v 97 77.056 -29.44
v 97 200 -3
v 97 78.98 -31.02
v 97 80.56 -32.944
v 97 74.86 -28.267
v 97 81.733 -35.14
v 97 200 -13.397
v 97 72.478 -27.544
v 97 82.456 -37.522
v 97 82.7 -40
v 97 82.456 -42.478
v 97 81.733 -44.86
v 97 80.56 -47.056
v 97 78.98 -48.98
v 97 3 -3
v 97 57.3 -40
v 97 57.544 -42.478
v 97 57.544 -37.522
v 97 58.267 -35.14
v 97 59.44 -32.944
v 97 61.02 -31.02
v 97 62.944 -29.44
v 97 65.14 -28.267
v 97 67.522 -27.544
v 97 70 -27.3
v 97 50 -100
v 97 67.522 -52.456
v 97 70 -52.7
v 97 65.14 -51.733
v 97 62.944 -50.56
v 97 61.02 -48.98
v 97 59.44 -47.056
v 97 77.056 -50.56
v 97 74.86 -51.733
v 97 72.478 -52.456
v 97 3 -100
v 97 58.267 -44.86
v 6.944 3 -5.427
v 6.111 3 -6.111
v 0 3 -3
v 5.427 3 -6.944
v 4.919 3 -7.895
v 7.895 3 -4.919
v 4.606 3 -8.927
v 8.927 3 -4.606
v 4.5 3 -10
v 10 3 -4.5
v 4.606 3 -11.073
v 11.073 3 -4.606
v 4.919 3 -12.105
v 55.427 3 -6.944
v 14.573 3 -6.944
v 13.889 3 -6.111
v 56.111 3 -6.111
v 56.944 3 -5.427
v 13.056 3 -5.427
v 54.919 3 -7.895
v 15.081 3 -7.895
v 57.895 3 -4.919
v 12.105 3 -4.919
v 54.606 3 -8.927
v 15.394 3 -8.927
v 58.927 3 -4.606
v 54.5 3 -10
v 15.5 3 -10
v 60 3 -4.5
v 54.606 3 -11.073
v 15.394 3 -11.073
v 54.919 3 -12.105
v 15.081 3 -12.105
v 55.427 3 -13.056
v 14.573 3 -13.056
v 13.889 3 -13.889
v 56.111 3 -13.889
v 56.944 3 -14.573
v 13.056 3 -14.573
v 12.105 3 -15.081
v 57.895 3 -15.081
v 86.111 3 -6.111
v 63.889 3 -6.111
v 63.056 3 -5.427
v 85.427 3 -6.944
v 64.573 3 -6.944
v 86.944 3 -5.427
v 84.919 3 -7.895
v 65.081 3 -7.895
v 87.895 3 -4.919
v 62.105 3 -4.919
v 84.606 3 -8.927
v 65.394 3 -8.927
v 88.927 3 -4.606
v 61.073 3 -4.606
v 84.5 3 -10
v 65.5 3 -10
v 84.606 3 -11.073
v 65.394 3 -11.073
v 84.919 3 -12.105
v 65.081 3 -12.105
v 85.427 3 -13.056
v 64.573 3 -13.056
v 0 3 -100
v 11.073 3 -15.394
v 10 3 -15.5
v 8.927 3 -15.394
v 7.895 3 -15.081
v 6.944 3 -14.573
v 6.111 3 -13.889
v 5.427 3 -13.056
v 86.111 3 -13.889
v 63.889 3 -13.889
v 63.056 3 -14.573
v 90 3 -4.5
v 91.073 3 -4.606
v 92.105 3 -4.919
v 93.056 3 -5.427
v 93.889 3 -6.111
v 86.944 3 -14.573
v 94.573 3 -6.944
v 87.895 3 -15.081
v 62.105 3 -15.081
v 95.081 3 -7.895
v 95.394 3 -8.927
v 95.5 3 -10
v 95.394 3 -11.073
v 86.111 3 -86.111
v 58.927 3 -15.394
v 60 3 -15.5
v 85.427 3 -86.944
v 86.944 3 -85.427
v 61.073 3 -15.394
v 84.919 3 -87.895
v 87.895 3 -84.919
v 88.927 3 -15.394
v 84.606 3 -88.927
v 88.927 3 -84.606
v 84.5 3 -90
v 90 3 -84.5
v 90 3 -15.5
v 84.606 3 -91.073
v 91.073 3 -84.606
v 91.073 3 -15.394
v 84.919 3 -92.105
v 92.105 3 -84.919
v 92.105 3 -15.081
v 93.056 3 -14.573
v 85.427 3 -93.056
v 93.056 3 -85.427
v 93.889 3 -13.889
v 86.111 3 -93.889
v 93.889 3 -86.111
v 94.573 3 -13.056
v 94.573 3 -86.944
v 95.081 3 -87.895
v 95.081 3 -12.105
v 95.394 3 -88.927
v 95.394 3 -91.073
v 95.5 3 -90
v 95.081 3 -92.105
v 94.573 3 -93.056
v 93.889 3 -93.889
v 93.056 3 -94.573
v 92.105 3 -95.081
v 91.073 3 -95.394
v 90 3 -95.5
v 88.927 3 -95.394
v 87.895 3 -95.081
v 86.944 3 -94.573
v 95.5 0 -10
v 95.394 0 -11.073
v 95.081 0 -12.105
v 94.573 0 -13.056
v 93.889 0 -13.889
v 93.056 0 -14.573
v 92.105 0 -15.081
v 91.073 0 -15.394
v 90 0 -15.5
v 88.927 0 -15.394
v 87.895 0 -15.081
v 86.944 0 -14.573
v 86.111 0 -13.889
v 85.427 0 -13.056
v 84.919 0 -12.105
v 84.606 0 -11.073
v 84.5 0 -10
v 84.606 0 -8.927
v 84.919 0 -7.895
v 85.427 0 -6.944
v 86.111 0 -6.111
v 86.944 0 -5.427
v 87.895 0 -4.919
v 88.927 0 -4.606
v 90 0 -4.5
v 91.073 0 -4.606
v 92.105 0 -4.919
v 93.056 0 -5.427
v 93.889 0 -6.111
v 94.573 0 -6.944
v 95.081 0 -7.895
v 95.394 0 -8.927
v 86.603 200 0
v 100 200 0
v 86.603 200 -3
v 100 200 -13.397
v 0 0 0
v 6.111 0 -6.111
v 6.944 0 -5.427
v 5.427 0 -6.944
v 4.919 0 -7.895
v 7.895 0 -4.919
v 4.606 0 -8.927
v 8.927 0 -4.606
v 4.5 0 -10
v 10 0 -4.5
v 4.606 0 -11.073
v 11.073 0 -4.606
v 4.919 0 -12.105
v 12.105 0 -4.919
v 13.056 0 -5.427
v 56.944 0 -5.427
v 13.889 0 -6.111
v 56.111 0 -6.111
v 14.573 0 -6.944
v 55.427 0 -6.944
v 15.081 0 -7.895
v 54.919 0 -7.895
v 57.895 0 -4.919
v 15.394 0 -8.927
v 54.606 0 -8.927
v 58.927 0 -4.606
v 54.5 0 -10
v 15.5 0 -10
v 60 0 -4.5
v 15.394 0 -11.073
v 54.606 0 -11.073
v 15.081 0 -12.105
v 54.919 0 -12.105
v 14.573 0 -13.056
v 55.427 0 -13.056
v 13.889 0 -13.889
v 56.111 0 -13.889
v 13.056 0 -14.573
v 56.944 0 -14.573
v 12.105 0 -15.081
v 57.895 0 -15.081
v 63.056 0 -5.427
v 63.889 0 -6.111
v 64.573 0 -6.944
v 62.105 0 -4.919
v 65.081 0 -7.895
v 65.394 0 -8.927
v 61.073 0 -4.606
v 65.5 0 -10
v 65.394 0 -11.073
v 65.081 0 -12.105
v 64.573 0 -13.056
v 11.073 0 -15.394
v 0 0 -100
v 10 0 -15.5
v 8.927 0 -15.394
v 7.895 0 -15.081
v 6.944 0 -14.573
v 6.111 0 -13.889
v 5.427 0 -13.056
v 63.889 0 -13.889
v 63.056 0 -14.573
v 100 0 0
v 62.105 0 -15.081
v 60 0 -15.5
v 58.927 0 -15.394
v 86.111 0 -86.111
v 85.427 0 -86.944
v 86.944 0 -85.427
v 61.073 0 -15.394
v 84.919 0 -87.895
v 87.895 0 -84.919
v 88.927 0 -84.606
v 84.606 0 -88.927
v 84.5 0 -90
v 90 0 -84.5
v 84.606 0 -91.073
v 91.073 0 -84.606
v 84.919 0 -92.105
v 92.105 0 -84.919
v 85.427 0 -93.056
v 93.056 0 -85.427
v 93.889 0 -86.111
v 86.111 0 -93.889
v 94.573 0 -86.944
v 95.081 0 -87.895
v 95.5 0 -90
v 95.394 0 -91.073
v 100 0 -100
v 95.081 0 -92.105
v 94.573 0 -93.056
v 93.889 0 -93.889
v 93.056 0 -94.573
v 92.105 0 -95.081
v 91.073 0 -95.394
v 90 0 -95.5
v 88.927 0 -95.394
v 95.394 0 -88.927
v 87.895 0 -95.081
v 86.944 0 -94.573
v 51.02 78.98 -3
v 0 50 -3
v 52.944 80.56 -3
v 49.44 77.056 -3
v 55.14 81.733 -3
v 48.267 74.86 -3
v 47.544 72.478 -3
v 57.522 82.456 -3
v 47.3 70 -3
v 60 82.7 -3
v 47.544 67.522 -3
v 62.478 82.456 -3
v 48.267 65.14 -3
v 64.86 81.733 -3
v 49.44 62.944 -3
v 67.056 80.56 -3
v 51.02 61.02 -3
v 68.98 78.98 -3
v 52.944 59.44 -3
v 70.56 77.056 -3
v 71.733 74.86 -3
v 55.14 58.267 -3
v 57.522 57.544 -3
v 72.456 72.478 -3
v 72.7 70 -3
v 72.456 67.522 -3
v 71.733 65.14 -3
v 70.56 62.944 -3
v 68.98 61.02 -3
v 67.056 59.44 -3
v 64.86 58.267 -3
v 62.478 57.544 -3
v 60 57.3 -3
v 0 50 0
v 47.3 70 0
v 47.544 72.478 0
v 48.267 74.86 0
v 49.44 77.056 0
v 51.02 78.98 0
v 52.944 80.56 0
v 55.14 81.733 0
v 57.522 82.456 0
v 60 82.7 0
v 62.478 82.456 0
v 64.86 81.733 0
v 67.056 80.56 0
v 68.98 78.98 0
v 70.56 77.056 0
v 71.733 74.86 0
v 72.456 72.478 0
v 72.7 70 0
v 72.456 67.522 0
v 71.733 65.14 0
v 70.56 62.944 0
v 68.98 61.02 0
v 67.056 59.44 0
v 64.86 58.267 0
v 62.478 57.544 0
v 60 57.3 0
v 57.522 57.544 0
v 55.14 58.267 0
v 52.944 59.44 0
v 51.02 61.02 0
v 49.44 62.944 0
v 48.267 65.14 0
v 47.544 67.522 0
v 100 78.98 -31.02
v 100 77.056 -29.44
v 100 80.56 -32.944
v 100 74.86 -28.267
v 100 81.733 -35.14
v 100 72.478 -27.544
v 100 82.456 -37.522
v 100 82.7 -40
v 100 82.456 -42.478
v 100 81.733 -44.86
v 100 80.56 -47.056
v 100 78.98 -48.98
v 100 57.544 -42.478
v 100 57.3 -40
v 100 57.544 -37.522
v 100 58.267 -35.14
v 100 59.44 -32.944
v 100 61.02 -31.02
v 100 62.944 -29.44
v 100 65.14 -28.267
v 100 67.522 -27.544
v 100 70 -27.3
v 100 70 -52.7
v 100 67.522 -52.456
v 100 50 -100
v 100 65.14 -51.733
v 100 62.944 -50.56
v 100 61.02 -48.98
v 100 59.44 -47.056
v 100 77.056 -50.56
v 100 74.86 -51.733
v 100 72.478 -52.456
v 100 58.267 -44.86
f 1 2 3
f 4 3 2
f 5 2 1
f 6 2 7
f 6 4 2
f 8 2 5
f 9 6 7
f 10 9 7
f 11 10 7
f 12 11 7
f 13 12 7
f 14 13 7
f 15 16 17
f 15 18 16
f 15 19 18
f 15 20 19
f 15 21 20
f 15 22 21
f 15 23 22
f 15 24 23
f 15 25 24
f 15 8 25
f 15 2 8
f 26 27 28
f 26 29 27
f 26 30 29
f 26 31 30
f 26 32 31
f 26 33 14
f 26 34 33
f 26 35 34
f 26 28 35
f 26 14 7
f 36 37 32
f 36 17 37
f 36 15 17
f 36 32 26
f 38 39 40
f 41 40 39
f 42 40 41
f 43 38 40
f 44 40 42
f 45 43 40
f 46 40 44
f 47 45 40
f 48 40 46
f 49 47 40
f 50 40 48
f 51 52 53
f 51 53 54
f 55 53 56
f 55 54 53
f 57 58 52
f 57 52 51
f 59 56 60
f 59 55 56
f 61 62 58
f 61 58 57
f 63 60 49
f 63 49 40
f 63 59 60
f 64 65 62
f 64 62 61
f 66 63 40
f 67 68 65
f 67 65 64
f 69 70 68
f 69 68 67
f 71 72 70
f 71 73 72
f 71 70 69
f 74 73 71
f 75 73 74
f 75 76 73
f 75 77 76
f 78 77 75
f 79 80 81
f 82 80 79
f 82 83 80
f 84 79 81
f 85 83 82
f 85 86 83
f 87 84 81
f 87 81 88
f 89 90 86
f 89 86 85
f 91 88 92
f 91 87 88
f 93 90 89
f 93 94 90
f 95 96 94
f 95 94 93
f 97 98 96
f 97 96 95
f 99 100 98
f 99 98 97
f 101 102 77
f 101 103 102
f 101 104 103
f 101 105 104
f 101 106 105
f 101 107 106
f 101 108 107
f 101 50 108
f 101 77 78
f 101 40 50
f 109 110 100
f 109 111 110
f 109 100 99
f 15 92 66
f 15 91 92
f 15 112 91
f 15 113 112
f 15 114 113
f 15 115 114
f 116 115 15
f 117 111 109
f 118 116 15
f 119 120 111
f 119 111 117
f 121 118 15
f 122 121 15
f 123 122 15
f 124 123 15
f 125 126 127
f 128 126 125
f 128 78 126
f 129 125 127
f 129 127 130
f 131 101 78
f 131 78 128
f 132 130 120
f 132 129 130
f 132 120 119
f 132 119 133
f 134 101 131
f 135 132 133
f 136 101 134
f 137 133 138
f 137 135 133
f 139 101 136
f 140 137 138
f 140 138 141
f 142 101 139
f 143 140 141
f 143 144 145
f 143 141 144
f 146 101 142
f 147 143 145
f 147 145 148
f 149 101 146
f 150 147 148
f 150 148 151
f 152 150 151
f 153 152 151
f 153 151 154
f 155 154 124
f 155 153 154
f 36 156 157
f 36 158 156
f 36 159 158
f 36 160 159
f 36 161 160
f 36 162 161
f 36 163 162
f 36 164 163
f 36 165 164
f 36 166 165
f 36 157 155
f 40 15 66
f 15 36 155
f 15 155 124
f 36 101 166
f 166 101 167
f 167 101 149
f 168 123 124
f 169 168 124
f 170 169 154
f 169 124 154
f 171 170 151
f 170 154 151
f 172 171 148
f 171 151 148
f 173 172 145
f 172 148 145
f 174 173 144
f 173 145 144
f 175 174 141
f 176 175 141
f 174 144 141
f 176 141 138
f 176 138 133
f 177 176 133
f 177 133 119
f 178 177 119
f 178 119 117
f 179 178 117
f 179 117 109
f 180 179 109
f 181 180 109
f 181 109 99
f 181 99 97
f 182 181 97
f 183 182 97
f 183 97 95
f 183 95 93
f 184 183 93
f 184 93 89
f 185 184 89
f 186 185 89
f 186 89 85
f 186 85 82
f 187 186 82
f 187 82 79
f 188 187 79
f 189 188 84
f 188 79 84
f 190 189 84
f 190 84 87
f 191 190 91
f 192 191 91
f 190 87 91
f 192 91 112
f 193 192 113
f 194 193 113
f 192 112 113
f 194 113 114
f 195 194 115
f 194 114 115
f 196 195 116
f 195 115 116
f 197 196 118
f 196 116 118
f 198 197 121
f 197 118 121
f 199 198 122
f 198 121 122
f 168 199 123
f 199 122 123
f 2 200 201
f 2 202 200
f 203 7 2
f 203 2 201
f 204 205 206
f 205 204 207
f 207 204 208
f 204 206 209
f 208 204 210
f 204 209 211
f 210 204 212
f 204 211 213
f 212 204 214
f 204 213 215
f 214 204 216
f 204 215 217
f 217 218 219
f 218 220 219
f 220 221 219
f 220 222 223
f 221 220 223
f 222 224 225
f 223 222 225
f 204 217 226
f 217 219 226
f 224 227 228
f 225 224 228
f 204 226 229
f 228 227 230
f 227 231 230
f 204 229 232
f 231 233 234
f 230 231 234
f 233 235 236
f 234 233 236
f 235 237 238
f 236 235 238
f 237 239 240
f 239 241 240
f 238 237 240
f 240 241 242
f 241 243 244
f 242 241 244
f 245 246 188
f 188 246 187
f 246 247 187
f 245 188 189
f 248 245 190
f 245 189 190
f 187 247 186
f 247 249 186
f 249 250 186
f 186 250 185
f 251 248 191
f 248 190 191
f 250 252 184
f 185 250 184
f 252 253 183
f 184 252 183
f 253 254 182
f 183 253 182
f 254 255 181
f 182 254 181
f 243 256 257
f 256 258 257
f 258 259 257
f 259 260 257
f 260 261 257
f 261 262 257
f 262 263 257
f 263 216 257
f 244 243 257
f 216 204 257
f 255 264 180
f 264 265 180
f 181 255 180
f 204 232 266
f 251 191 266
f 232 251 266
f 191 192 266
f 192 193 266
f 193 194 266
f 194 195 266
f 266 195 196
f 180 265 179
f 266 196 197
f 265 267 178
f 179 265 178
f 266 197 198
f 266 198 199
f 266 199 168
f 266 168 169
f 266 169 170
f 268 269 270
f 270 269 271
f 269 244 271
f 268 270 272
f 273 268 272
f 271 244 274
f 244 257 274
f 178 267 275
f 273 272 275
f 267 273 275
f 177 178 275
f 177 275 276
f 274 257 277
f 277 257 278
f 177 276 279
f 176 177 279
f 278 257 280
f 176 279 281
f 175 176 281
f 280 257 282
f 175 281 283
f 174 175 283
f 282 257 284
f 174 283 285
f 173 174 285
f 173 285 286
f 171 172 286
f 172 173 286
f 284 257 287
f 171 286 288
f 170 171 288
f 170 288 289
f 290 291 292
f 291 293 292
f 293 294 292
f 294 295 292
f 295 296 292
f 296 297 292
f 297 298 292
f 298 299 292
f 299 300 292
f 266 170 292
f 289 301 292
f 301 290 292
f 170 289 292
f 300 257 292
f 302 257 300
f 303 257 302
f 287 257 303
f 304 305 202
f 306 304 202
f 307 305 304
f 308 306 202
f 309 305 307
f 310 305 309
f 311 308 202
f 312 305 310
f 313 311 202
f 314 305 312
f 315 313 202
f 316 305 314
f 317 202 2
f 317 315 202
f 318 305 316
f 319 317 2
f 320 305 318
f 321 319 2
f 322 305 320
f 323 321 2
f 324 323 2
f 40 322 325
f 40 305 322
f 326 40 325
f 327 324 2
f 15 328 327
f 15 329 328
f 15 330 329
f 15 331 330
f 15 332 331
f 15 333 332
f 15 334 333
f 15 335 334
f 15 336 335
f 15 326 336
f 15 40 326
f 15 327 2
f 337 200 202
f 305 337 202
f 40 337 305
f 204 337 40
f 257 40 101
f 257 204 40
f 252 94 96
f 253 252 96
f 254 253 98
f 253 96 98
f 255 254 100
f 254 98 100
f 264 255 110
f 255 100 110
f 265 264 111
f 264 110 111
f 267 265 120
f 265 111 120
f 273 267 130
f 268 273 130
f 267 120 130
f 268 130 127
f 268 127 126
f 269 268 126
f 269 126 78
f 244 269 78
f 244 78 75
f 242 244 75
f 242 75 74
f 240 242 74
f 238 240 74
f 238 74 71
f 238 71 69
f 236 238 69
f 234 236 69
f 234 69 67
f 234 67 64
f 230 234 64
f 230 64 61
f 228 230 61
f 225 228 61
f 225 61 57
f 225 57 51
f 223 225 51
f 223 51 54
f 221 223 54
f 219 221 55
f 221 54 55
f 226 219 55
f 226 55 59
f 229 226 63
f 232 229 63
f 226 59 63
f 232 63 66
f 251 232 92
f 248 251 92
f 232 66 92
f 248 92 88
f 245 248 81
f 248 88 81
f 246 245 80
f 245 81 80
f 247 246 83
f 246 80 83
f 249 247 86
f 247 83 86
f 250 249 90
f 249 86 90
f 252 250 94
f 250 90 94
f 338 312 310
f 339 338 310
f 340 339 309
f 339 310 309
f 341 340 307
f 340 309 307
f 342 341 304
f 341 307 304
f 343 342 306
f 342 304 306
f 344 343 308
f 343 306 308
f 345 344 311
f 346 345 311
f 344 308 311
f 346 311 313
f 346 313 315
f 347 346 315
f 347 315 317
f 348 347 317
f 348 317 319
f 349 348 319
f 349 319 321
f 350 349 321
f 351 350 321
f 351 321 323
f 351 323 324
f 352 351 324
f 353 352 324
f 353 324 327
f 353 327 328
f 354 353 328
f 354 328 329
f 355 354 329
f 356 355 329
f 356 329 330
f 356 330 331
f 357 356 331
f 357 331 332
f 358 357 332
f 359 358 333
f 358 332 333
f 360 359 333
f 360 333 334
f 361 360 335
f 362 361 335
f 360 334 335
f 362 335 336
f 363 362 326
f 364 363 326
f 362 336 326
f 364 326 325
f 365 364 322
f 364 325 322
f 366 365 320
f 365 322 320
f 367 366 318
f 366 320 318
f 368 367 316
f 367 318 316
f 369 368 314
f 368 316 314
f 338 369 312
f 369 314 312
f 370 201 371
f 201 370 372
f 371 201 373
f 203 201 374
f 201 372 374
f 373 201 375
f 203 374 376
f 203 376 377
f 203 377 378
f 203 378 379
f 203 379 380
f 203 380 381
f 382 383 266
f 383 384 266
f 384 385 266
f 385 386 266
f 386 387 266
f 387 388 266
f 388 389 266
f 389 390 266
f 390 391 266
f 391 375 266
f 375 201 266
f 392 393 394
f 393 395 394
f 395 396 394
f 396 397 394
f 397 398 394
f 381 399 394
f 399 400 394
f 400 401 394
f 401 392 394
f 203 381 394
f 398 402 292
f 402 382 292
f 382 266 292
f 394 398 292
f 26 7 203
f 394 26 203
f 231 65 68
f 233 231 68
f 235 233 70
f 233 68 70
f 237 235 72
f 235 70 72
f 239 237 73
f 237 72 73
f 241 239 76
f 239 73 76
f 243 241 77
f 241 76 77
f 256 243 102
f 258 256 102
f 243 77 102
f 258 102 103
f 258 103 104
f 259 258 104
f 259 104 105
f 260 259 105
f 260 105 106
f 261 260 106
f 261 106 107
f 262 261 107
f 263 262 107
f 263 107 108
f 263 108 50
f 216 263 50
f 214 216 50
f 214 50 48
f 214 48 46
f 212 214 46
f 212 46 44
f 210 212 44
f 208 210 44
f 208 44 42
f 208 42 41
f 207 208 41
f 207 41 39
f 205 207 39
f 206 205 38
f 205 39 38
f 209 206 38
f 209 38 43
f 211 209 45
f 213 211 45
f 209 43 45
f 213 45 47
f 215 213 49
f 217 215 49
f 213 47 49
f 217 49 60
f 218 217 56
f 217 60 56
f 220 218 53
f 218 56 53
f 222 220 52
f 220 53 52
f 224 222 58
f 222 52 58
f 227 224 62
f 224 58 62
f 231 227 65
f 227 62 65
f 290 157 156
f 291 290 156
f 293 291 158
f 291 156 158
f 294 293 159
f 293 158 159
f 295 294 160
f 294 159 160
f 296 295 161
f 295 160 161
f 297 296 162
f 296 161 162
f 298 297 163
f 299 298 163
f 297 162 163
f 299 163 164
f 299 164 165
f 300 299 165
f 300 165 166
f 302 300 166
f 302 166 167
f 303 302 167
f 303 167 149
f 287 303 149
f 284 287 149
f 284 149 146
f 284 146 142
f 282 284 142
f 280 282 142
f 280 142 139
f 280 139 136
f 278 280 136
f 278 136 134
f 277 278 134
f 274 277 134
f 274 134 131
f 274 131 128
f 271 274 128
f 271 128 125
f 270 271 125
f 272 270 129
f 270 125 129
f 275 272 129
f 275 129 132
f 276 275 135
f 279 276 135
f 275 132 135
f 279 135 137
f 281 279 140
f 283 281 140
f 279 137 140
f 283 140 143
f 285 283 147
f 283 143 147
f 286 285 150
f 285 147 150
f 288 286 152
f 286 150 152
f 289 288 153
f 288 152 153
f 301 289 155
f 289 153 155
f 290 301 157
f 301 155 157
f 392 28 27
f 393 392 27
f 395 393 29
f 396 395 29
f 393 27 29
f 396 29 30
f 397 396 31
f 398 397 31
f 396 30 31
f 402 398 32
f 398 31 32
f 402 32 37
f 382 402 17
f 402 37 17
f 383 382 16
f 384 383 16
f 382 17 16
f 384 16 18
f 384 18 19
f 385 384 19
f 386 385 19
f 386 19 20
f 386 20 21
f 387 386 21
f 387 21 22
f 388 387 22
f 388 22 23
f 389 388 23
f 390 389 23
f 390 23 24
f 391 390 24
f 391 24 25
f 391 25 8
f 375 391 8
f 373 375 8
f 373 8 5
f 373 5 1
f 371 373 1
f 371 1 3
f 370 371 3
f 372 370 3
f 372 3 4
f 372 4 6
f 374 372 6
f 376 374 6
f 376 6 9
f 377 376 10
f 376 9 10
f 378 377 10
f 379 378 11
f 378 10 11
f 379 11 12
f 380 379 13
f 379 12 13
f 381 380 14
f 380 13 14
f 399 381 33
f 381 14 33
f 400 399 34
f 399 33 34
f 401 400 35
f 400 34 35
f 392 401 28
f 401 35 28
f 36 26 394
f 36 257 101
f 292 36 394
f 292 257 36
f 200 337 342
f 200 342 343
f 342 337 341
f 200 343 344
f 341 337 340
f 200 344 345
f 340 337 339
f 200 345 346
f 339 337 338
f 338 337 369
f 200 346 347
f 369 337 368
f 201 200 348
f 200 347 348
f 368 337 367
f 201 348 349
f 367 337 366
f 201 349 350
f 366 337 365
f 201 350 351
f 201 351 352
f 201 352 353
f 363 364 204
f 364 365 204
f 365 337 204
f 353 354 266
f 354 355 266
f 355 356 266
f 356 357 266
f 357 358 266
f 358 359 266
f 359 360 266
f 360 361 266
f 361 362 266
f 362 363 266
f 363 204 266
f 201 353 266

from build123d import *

# Parameters (mm, degrees)
SKIZZE1_W                       = 100
SKIZZE1_H                       = 100
AUFSATZ_LINEAR_AUSTRAGEN1_DEPTH = 200
WANDUNG1_T                      = -3
FASE1_SIZE                      = 150
FASE1_SIZE2                     = 86.602540378
FASE1_PART_2_SIZE               = 150
FASE1_PART_2_SIZE2              = 86.602540378
BOHRUNG1_D                      = 25.4
BOHRUNG1_DEPTH                  = 3
BOHRUNG1_ON_FACE_2_D            = 25.4
BOHRUNG1_ON_FACE_2_DEPTH        = 3
DURCHGANGSLOCH_F_R_M101_D       = 11
DURCHGANGSLOCH_F_R_M101_DEPTH   = 3


with BuildPart() as part:
    # Skizze1 → Aufsatz-Linear austragen1 (new body)
    with BuildSketch(Plane(origin=(0, 0, 0), x_dir=(1, 0, 0), z_dir=(0, 1, 0))):
        with Locations((50, 50)):
            Rectangle(SKIZZE1_W, SKIZZE1_H)
    extrude(amount=AUFSATZ_LINEAR_AUSTRAGEN1_DEPTH)

    # Wandung1
    wandung1_openings = [part.faces().sort_by_distance(p)[0] for p in [
        (50, 200, -50),
        (50, 100, -100),
        (0, 100, -50),
    ]]
    offset(amount=WANDUNG1_T, openings=wandung1_openings, kind=Kind.INTERSECTION)

    # Fase1
    fase1_edges = [part.edges().sort_by_distance(p)[0] for p in [
        (98.5, 200, -100),
    ]]
    fase1_side = [part.faces().sort_by_distance(p)[0] for p in [
        (98.5, 197.763932023, -100),
    ]]
    chamfer(fase1_edges, length=FASE1_SIZE, length2=FASE1_SIZE2, reference=fase1_side[0])

    # Fase1 part 2
    fase1_part_2_edges = [part.edges().sort_by_distance(p)[0] for p in [
        (0, 200, -1.5),
    ]]
    fase1_part_2_side = [part.faces().sort_by_distance(p)[0] for p in [
        (0, 1.5, -97.763932023),
    ]]
    chamfer(fase1_part_2_edges, length=FASE1_PART_2_SIZE, length2=FASE1_PART_2_SIZE2, reference=fase1_part_2_side[0])

    # Bohrung1
    with Locations(Plane(origin=(100, 70, -40), x_dir=(0, 0, 1), z_dir=(1, 0, 0))):
        with Locations((0, 0)):
            Hole(BOHRUNG1_D / 2, depth=BOHRUNG1_DEPTH)

    # Bohrung1 on face 2
    with Locations(Plane(origin=(60, 70, 0), x_dir=(1, 0, 0), z_dir=(0, 0, 1))):
        with Locations((0, 0)):
            Hole(BOHRUNG1_ON_FACE_2_D / 2, depth=BOHRUNG1_ON_FACE_2_DEPTH)

    # Durchgangsloch für M101
    with Locations(Plane(origin=(0, 0, 0), x_dir=(-1, 0, 0), z_dir=(0, -1, 0))):
        with Locations((-90, 90), (-90, 10), (-60, 10), (-10, 10)):
            Hole(DURCHGANGSLOCH_F_R_M101_D / 2, depth=DURCHGANGSLOCH_F_R_M101_DEPTH)


solid = part.part
